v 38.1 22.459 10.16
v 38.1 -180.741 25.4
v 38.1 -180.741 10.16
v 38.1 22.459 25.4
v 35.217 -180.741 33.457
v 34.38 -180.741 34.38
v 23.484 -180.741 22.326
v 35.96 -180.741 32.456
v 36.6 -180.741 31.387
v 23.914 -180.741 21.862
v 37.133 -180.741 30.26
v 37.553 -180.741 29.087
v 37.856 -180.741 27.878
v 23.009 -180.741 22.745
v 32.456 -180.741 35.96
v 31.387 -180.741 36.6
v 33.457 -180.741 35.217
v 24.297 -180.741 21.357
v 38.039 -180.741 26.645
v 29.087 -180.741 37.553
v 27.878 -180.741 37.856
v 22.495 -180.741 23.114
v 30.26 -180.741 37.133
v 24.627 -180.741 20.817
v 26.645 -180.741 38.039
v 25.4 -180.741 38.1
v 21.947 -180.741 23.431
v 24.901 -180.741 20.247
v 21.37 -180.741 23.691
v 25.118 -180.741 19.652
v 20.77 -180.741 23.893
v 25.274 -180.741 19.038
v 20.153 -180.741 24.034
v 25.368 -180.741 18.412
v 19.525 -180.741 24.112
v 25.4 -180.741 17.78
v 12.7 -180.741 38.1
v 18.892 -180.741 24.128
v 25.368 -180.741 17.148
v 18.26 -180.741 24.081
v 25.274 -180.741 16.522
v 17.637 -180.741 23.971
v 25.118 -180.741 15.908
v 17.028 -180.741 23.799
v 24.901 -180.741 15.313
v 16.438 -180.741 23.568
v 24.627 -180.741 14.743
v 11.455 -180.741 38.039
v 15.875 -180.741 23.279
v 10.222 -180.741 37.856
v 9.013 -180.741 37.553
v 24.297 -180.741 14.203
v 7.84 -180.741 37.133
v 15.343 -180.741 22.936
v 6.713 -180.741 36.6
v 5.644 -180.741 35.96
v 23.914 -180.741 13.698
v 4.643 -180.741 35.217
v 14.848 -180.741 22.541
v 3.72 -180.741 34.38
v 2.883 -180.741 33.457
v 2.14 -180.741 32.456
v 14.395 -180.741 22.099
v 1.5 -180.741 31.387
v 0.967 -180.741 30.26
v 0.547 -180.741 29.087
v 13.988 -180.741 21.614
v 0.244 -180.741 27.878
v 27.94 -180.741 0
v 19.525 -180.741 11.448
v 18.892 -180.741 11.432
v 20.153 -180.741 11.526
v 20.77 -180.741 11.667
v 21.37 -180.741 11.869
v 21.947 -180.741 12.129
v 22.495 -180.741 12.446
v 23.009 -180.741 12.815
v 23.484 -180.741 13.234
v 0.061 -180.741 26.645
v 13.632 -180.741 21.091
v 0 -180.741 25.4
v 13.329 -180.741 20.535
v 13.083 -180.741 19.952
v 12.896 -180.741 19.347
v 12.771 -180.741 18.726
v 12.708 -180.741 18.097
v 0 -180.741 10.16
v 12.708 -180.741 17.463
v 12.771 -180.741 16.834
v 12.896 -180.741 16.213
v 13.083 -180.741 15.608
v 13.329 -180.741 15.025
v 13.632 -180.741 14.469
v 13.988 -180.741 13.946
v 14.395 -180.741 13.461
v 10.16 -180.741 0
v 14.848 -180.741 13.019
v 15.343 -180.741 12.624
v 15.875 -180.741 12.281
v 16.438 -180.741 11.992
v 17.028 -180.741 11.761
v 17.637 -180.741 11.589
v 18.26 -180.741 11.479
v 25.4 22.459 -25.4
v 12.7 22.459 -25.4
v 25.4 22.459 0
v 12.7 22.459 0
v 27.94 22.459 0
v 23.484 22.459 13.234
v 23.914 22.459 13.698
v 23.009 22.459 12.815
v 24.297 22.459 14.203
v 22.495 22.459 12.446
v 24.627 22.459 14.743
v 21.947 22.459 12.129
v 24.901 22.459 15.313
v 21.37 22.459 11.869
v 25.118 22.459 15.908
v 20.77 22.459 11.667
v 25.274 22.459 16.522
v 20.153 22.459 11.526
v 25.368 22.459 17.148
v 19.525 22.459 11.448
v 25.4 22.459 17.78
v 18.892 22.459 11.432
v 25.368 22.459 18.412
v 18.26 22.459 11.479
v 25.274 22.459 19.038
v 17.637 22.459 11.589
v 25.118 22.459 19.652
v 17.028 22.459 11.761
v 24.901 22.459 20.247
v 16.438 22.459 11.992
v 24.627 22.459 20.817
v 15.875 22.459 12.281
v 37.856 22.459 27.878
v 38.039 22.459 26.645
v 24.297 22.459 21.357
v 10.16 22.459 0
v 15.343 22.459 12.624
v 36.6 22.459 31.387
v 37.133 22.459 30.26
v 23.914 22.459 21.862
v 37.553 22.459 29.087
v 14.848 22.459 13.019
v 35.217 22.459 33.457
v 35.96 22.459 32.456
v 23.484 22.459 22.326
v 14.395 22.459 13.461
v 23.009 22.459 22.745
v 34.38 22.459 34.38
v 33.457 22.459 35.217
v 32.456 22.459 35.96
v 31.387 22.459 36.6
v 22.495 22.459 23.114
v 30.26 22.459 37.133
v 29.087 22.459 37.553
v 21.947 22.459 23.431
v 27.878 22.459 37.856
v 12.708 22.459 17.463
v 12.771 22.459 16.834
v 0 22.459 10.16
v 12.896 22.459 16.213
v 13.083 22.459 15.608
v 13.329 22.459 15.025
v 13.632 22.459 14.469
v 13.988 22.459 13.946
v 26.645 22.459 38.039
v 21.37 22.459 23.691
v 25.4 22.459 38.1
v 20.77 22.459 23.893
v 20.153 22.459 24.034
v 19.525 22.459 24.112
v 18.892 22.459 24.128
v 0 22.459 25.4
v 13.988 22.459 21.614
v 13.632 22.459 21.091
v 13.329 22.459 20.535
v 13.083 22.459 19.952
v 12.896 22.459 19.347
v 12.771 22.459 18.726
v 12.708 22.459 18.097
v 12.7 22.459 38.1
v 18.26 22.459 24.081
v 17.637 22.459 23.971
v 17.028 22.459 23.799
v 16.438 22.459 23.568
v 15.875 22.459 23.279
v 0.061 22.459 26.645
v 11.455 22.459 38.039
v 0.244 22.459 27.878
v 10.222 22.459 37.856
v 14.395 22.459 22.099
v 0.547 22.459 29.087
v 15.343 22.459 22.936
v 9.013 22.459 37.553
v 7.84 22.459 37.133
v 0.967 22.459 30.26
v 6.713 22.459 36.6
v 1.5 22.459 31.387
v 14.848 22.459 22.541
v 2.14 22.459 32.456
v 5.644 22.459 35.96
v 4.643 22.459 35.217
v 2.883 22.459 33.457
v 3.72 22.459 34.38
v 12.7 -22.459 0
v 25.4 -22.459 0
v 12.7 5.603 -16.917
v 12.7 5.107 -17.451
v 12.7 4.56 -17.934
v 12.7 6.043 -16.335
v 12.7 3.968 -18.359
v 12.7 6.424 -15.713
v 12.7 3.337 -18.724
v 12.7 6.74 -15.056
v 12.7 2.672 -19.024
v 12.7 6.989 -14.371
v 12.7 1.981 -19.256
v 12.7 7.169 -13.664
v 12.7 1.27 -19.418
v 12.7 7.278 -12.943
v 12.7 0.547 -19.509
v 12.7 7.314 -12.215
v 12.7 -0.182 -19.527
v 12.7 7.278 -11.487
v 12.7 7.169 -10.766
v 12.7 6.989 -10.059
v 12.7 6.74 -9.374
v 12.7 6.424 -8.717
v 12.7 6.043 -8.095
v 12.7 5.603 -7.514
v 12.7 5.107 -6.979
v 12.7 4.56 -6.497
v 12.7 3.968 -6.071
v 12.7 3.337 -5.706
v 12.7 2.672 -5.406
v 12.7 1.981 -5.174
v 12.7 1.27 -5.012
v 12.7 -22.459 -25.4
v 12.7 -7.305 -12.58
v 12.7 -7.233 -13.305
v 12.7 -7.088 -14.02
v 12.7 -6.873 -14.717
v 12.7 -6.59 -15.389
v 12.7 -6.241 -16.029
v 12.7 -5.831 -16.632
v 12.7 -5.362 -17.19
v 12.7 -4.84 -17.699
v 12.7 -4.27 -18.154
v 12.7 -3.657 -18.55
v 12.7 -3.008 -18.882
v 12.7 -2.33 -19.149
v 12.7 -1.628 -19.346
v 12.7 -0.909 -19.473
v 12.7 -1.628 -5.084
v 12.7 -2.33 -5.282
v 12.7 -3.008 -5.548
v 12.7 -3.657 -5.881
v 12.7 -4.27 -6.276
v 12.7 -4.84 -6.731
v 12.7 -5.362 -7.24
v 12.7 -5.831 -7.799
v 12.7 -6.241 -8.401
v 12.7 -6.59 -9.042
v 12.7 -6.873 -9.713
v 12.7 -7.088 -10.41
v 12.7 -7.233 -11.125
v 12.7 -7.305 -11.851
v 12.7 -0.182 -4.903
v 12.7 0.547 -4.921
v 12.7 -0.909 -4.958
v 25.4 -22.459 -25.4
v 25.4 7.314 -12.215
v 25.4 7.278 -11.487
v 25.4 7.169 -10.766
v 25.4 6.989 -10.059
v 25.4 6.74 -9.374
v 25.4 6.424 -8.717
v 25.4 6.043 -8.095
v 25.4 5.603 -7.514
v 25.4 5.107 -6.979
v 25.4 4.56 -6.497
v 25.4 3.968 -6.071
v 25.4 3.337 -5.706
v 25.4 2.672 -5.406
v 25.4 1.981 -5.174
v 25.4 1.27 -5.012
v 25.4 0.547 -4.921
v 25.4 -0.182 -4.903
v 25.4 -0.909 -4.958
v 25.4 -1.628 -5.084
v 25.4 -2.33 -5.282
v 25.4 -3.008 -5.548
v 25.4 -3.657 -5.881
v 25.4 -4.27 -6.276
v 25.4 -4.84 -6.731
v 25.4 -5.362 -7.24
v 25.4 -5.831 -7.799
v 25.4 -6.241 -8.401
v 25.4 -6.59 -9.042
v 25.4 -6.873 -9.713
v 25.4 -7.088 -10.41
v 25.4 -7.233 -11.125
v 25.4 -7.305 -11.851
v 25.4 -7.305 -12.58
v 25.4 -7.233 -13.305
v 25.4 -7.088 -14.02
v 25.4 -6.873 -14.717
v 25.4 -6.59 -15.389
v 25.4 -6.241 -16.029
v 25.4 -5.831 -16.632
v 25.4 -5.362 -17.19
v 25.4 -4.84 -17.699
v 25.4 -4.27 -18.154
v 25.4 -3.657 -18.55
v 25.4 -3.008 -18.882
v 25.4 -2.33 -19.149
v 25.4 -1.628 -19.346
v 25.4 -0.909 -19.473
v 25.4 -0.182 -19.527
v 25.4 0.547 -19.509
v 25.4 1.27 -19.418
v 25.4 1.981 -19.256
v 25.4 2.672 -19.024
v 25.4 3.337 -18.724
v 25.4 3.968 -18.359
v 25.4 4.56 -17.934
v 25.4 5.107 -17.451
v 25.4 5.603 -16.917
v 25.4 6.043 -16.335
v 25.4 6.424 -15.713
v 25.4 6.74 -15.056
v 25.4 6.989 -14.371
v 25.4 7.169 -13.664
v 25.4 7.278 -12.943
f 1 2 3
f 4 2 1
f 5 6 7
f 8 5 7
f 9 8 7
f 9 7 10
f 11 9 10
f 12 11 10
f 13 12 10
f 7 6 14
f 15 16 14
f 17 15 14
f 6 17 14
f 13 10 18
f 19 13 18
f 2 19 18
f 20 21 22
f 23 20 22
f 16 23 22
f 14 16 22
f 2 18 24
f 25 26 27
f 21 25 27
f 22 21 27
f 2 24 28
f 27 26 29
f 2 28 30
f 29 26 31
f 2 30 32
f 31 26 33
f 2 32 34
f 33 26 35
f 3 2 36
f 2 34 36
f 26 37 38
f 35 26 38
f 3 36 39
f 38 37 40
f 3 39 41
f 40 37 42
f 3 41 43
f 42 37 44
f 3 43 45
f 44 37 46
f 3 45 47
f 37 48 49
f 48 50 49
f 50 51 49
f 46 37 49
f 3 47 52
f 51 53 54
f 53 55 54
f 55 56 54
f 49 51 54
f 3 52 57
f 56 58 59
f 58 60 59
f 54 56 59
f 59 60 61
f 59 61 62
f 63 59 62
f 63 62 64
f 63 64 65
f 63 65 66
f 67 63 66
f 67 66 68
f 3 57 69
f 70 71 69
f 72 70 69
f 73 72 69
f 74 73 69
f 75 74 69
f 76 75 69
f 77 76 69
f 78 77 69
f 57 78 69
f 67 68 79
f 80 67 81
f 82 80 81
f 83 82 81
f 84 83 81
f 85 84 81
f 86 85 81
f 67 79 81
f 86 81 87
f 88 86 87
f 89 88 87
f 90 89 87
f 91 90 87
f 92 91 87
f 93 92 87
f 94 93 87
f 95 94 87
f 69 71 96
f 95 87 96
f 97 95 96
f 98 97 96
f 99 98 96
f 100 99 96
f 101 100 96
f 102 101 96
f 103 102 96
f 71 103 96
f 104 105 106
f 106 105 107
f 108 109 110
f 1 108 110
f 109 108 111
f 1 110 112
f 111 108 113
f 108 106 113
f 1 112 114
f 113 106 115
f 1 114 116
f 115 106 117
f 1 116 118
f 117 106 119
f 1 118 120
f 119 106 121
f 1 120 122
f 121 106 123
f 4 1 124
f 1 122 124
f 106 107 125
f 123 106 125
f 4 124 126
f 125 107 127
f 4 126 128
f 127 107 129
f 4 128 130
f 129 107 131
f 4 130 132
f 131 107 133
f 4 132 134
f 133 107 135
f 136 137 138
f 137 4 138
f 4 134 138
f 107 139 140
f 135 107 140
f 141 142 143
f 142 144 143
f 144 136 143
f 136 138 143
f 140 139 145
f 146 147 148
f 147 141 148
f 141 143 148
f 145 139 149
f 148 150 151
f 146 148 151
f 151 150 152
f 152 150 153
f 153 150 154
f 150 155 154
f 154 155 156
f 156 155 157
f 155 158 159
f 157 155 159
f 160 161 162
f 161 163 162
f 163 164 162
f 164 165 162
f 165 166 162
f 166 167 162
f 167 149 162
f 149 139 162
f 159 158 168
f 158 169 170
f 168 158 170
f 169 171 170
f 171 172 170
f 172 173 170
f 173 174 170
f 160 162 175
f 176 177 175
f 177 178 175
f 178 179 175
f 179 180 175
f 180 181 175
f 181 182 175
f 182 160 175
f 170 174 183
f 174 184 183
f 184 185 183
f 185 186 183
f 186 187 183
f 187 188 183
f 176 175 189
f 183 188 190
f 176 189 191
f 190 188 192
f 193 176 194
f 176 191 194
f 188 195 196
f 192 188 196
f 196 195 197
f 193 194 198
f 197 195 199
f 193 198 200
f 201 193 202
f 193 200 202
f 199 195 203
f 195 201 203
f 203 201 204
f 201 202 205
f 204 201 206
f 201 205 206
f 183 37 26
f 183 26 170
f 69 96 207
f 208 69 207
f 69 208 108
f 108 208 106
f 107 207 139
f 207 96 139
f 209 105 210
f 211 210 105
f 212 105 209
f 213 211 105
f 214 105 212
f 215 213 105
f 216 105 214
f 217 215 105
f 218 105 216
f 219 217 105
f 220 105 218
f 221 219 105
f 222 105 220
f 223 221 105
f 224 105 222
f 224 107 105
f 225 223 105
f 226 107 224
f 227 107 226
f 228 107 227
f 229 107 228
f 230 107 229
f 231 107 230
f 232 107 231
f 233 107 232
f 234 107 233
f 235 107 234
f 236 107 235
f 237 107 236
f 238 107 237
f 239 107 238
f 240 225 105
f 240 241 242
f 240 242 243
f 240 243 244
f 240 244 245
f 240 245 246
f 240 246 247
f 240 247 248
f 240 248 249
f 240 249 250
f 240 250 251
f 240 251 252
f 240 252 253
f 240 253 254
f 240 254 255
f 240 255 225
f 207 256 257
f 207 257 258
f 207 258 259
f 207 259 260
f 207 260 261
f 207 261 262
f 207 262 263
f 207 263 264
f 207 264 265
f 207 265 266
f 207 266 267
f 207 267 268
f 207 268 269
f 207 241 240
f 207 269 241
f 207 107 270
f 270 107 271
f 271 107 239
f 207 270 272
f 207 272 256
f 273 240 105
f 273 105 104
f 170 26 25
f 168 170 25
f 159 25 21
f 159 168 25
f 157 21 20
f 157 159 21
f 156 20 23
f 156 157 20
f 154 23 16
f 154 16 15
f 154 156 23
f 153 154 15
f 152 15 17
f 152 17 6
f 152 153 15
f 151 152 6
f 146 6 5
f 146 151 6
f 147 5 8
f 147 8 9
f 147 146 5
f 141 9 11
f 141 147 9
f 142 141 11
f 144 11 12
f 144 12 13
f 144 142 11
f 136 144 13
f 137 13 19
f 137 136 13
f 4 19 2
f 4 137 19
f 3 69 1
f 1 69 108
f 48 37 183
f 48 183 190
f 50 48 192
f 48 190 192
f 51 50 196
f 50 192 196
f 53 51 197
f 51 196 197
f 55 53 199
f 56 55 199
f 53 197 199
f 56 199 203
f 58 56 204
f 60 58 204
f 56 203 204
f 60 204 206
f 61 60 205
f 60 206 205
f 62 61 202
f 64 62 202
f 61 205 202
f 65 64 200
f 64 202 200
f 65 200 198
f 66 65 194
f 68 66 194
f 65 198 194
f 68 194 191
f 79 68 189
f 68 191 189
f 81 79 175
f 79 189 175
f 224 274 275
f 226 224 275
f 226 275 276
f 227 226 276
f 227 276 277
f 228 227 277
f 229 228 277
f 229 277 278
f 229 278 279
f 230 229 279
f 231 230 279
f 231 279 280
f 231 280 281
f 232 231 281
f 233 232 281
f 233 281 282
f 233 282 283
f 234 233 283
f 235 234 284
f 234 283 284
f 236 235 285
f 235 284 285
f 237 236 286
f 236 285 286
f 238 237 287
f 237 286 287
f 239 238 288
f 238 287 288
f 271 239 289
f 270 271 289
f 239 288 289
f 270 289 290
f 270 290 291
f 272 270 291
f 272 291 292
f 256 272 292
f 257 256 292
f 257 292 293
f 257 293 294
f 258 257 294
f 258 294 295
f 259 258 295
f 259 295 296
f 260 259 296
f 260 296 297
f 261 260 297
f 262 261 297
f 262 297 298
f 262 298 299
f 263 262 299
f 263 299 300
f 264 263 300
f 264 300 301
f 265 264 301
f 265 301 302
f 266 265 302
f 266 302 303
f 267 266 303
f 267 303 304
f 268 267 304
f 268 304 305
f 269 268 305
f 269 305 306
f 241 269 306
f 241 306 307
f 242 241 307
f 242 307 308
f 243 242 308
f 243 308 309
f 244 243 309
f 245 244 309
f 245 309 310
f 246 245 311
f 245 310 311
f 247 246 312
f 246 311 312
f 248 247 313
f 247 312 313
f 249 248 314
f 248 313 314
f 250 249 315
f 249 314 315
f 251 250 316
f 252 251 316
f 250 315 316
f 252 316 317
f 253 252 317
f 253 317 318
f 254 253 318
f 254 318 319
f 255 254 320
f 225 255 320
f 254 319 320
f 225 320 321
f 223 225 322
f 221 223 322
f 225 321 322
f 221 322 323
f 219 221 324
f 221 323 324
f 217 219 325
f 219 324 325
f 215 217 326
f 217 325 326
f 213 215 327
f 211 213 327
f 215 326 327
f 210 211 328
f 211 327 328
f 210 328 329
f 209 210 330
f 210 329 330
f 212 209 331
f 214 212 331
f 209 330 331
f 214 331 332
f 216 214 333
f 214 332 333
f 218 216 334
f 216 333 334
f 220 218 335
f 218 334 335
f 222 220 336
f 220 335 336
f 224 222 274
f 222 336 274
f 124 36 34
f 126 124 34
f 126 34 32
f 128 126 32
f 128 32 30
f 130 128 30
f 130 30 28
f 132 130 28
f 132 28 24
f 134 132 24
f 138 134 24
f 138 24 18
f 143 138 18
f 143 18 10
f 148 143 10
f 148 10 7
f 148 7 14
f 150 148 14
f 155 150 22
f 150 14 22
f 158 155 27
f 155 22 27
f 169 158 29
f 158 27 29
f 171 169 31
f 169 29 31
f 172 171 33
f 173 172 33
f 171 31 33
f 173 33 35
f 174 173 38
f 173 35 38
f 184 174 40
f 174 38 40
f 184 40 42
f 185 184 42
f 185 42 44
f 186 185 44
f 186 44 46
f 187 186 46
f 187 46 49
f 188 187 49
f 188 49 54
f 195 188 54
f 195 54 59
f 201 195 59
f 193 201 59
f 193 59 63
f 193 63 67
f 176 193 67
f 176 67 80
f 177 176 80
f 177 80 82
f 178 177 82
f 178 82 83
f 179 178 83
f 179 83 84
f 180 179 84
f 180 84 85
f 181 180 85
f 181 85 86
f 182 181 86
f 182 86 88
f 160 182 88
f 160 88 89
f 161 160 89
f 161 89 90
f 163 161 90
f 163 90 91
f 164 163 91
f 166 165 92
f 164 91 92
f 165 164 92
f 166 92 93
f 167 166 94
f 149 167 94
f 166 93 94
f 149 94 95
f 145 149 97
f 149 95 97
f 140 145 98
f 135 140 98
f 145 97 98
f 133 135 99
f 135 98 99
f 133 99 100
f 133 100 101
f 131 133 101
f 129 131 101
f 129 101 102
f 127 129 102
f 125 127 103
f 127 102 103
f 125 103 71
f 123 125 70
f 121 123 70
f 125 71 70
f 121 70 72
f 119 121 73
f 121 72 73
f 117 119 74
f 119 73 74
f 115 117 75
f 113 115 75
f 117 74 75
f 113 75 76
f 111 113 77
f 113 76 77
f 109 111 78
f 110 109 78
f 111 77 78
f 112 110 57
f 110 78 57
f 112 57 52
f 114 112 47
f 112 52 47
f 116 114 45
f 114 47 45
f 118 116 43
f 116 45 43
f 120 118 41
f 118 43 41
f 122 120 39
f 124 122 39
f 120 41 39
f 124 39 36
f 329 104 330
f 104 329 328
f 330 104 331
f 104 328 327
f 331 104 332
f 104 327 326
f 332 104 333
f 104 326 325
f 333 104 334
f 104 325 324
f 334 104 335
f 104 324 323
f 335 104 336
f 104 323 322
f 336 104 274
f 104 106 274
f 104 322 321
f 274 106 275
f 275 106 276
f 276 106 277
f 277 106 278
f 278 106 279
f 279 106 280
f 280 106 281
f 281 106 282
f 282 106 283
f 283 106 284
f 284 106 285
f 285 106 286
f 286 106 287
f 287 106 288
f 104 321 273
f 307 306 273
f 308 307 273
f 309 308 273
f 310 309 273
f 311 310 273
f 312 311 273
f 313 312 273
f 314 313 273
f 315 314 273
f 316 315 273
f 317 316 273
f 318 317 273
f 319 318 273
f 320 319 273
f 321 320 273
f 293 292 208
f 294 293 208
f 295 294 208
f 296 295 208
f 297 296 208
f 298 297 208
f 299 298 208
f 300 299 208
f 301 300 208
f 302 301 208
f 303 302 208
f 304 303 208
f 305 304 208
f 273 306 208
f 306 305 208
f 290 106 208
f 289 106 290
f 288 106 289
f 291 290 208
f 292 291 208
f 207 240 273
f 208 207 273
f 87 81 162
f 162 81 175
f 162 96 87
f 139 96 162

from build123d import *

# Parameters (mm, degrees)
F0_W     = 203.2
F0_H     = 12.7
F1_DEPTH = 38.1
F2_W     = 12.7
F2_H     = 44.917874
F3_DEPTH = 25.4
F4_R     = 12.7
F5_SIZE  = 10.16
F6_R     = 6.35
F7_DEPTH = 228.6
F8_R     = 7.314346
F9_DEPTH = 25.4


with BuildPart() as f1:
    # F0 (on Right) → F1 (new body)
    with BuildSketch(Plane.YZ):
        with Locations((-79.141063, 31.75)):
            Rectangle(F0_W, F0_H)
        with Locations((-79.141063, 19.05)):
            Rectangle(F0_W, F0_H)
        with Locations((-79.141063, 6.35)):
            Rectangle(F0_W, F0_H)
    extrude(amount=F1_DEPTH)

    # F2 (on face) → F3 (join)
    with BuildSketch(Plane(origin=(0, 0, 0), x_dir=(1, 0, 0), z_dir=(0, 0, -1))):
        with Locations((19.05, 0)):
            Rectangle(F2_W, F2_H)
    extrude(amount=F3_DEPTH)

    # F4
    f4_edges = [f1.edges().sort_by_distance(p)[0] for p in [
        (38.1, -79.141063, 38.1),
        (0, -79.141063, 38.1),
    ]]
    fillet(f4_edges, radius=F4_R)

    # F5
    f5_edges = [f1.edges().sort_by_distance(p)[0] for p in [
        (38.1, -79.141063, 0),
        (0, -79.141063, 0),
    ]]
    chamfer(f5_edges, length=F5_SIZE)

    # F6 (on face) → F7 (cut)
    with BuildSketch(Plane.XZ.offset(180.741063)):
        with Locations((19.05, 17.78)):
            Circle(F6_R)
    extrude(amount=-F7_DEPTH, mode=Mode.SUBTRACT)

    # F8 (on face) → F9 (cut)
    with BuildSketch(Plane.YZ.offset(25.4)):
        with Locations((0, -12.215126)):
            Circle(F8_R)
    extrude(amount=-F9_DEPTH, mode=Mode.SUBTRACT)


solid = f1.part
